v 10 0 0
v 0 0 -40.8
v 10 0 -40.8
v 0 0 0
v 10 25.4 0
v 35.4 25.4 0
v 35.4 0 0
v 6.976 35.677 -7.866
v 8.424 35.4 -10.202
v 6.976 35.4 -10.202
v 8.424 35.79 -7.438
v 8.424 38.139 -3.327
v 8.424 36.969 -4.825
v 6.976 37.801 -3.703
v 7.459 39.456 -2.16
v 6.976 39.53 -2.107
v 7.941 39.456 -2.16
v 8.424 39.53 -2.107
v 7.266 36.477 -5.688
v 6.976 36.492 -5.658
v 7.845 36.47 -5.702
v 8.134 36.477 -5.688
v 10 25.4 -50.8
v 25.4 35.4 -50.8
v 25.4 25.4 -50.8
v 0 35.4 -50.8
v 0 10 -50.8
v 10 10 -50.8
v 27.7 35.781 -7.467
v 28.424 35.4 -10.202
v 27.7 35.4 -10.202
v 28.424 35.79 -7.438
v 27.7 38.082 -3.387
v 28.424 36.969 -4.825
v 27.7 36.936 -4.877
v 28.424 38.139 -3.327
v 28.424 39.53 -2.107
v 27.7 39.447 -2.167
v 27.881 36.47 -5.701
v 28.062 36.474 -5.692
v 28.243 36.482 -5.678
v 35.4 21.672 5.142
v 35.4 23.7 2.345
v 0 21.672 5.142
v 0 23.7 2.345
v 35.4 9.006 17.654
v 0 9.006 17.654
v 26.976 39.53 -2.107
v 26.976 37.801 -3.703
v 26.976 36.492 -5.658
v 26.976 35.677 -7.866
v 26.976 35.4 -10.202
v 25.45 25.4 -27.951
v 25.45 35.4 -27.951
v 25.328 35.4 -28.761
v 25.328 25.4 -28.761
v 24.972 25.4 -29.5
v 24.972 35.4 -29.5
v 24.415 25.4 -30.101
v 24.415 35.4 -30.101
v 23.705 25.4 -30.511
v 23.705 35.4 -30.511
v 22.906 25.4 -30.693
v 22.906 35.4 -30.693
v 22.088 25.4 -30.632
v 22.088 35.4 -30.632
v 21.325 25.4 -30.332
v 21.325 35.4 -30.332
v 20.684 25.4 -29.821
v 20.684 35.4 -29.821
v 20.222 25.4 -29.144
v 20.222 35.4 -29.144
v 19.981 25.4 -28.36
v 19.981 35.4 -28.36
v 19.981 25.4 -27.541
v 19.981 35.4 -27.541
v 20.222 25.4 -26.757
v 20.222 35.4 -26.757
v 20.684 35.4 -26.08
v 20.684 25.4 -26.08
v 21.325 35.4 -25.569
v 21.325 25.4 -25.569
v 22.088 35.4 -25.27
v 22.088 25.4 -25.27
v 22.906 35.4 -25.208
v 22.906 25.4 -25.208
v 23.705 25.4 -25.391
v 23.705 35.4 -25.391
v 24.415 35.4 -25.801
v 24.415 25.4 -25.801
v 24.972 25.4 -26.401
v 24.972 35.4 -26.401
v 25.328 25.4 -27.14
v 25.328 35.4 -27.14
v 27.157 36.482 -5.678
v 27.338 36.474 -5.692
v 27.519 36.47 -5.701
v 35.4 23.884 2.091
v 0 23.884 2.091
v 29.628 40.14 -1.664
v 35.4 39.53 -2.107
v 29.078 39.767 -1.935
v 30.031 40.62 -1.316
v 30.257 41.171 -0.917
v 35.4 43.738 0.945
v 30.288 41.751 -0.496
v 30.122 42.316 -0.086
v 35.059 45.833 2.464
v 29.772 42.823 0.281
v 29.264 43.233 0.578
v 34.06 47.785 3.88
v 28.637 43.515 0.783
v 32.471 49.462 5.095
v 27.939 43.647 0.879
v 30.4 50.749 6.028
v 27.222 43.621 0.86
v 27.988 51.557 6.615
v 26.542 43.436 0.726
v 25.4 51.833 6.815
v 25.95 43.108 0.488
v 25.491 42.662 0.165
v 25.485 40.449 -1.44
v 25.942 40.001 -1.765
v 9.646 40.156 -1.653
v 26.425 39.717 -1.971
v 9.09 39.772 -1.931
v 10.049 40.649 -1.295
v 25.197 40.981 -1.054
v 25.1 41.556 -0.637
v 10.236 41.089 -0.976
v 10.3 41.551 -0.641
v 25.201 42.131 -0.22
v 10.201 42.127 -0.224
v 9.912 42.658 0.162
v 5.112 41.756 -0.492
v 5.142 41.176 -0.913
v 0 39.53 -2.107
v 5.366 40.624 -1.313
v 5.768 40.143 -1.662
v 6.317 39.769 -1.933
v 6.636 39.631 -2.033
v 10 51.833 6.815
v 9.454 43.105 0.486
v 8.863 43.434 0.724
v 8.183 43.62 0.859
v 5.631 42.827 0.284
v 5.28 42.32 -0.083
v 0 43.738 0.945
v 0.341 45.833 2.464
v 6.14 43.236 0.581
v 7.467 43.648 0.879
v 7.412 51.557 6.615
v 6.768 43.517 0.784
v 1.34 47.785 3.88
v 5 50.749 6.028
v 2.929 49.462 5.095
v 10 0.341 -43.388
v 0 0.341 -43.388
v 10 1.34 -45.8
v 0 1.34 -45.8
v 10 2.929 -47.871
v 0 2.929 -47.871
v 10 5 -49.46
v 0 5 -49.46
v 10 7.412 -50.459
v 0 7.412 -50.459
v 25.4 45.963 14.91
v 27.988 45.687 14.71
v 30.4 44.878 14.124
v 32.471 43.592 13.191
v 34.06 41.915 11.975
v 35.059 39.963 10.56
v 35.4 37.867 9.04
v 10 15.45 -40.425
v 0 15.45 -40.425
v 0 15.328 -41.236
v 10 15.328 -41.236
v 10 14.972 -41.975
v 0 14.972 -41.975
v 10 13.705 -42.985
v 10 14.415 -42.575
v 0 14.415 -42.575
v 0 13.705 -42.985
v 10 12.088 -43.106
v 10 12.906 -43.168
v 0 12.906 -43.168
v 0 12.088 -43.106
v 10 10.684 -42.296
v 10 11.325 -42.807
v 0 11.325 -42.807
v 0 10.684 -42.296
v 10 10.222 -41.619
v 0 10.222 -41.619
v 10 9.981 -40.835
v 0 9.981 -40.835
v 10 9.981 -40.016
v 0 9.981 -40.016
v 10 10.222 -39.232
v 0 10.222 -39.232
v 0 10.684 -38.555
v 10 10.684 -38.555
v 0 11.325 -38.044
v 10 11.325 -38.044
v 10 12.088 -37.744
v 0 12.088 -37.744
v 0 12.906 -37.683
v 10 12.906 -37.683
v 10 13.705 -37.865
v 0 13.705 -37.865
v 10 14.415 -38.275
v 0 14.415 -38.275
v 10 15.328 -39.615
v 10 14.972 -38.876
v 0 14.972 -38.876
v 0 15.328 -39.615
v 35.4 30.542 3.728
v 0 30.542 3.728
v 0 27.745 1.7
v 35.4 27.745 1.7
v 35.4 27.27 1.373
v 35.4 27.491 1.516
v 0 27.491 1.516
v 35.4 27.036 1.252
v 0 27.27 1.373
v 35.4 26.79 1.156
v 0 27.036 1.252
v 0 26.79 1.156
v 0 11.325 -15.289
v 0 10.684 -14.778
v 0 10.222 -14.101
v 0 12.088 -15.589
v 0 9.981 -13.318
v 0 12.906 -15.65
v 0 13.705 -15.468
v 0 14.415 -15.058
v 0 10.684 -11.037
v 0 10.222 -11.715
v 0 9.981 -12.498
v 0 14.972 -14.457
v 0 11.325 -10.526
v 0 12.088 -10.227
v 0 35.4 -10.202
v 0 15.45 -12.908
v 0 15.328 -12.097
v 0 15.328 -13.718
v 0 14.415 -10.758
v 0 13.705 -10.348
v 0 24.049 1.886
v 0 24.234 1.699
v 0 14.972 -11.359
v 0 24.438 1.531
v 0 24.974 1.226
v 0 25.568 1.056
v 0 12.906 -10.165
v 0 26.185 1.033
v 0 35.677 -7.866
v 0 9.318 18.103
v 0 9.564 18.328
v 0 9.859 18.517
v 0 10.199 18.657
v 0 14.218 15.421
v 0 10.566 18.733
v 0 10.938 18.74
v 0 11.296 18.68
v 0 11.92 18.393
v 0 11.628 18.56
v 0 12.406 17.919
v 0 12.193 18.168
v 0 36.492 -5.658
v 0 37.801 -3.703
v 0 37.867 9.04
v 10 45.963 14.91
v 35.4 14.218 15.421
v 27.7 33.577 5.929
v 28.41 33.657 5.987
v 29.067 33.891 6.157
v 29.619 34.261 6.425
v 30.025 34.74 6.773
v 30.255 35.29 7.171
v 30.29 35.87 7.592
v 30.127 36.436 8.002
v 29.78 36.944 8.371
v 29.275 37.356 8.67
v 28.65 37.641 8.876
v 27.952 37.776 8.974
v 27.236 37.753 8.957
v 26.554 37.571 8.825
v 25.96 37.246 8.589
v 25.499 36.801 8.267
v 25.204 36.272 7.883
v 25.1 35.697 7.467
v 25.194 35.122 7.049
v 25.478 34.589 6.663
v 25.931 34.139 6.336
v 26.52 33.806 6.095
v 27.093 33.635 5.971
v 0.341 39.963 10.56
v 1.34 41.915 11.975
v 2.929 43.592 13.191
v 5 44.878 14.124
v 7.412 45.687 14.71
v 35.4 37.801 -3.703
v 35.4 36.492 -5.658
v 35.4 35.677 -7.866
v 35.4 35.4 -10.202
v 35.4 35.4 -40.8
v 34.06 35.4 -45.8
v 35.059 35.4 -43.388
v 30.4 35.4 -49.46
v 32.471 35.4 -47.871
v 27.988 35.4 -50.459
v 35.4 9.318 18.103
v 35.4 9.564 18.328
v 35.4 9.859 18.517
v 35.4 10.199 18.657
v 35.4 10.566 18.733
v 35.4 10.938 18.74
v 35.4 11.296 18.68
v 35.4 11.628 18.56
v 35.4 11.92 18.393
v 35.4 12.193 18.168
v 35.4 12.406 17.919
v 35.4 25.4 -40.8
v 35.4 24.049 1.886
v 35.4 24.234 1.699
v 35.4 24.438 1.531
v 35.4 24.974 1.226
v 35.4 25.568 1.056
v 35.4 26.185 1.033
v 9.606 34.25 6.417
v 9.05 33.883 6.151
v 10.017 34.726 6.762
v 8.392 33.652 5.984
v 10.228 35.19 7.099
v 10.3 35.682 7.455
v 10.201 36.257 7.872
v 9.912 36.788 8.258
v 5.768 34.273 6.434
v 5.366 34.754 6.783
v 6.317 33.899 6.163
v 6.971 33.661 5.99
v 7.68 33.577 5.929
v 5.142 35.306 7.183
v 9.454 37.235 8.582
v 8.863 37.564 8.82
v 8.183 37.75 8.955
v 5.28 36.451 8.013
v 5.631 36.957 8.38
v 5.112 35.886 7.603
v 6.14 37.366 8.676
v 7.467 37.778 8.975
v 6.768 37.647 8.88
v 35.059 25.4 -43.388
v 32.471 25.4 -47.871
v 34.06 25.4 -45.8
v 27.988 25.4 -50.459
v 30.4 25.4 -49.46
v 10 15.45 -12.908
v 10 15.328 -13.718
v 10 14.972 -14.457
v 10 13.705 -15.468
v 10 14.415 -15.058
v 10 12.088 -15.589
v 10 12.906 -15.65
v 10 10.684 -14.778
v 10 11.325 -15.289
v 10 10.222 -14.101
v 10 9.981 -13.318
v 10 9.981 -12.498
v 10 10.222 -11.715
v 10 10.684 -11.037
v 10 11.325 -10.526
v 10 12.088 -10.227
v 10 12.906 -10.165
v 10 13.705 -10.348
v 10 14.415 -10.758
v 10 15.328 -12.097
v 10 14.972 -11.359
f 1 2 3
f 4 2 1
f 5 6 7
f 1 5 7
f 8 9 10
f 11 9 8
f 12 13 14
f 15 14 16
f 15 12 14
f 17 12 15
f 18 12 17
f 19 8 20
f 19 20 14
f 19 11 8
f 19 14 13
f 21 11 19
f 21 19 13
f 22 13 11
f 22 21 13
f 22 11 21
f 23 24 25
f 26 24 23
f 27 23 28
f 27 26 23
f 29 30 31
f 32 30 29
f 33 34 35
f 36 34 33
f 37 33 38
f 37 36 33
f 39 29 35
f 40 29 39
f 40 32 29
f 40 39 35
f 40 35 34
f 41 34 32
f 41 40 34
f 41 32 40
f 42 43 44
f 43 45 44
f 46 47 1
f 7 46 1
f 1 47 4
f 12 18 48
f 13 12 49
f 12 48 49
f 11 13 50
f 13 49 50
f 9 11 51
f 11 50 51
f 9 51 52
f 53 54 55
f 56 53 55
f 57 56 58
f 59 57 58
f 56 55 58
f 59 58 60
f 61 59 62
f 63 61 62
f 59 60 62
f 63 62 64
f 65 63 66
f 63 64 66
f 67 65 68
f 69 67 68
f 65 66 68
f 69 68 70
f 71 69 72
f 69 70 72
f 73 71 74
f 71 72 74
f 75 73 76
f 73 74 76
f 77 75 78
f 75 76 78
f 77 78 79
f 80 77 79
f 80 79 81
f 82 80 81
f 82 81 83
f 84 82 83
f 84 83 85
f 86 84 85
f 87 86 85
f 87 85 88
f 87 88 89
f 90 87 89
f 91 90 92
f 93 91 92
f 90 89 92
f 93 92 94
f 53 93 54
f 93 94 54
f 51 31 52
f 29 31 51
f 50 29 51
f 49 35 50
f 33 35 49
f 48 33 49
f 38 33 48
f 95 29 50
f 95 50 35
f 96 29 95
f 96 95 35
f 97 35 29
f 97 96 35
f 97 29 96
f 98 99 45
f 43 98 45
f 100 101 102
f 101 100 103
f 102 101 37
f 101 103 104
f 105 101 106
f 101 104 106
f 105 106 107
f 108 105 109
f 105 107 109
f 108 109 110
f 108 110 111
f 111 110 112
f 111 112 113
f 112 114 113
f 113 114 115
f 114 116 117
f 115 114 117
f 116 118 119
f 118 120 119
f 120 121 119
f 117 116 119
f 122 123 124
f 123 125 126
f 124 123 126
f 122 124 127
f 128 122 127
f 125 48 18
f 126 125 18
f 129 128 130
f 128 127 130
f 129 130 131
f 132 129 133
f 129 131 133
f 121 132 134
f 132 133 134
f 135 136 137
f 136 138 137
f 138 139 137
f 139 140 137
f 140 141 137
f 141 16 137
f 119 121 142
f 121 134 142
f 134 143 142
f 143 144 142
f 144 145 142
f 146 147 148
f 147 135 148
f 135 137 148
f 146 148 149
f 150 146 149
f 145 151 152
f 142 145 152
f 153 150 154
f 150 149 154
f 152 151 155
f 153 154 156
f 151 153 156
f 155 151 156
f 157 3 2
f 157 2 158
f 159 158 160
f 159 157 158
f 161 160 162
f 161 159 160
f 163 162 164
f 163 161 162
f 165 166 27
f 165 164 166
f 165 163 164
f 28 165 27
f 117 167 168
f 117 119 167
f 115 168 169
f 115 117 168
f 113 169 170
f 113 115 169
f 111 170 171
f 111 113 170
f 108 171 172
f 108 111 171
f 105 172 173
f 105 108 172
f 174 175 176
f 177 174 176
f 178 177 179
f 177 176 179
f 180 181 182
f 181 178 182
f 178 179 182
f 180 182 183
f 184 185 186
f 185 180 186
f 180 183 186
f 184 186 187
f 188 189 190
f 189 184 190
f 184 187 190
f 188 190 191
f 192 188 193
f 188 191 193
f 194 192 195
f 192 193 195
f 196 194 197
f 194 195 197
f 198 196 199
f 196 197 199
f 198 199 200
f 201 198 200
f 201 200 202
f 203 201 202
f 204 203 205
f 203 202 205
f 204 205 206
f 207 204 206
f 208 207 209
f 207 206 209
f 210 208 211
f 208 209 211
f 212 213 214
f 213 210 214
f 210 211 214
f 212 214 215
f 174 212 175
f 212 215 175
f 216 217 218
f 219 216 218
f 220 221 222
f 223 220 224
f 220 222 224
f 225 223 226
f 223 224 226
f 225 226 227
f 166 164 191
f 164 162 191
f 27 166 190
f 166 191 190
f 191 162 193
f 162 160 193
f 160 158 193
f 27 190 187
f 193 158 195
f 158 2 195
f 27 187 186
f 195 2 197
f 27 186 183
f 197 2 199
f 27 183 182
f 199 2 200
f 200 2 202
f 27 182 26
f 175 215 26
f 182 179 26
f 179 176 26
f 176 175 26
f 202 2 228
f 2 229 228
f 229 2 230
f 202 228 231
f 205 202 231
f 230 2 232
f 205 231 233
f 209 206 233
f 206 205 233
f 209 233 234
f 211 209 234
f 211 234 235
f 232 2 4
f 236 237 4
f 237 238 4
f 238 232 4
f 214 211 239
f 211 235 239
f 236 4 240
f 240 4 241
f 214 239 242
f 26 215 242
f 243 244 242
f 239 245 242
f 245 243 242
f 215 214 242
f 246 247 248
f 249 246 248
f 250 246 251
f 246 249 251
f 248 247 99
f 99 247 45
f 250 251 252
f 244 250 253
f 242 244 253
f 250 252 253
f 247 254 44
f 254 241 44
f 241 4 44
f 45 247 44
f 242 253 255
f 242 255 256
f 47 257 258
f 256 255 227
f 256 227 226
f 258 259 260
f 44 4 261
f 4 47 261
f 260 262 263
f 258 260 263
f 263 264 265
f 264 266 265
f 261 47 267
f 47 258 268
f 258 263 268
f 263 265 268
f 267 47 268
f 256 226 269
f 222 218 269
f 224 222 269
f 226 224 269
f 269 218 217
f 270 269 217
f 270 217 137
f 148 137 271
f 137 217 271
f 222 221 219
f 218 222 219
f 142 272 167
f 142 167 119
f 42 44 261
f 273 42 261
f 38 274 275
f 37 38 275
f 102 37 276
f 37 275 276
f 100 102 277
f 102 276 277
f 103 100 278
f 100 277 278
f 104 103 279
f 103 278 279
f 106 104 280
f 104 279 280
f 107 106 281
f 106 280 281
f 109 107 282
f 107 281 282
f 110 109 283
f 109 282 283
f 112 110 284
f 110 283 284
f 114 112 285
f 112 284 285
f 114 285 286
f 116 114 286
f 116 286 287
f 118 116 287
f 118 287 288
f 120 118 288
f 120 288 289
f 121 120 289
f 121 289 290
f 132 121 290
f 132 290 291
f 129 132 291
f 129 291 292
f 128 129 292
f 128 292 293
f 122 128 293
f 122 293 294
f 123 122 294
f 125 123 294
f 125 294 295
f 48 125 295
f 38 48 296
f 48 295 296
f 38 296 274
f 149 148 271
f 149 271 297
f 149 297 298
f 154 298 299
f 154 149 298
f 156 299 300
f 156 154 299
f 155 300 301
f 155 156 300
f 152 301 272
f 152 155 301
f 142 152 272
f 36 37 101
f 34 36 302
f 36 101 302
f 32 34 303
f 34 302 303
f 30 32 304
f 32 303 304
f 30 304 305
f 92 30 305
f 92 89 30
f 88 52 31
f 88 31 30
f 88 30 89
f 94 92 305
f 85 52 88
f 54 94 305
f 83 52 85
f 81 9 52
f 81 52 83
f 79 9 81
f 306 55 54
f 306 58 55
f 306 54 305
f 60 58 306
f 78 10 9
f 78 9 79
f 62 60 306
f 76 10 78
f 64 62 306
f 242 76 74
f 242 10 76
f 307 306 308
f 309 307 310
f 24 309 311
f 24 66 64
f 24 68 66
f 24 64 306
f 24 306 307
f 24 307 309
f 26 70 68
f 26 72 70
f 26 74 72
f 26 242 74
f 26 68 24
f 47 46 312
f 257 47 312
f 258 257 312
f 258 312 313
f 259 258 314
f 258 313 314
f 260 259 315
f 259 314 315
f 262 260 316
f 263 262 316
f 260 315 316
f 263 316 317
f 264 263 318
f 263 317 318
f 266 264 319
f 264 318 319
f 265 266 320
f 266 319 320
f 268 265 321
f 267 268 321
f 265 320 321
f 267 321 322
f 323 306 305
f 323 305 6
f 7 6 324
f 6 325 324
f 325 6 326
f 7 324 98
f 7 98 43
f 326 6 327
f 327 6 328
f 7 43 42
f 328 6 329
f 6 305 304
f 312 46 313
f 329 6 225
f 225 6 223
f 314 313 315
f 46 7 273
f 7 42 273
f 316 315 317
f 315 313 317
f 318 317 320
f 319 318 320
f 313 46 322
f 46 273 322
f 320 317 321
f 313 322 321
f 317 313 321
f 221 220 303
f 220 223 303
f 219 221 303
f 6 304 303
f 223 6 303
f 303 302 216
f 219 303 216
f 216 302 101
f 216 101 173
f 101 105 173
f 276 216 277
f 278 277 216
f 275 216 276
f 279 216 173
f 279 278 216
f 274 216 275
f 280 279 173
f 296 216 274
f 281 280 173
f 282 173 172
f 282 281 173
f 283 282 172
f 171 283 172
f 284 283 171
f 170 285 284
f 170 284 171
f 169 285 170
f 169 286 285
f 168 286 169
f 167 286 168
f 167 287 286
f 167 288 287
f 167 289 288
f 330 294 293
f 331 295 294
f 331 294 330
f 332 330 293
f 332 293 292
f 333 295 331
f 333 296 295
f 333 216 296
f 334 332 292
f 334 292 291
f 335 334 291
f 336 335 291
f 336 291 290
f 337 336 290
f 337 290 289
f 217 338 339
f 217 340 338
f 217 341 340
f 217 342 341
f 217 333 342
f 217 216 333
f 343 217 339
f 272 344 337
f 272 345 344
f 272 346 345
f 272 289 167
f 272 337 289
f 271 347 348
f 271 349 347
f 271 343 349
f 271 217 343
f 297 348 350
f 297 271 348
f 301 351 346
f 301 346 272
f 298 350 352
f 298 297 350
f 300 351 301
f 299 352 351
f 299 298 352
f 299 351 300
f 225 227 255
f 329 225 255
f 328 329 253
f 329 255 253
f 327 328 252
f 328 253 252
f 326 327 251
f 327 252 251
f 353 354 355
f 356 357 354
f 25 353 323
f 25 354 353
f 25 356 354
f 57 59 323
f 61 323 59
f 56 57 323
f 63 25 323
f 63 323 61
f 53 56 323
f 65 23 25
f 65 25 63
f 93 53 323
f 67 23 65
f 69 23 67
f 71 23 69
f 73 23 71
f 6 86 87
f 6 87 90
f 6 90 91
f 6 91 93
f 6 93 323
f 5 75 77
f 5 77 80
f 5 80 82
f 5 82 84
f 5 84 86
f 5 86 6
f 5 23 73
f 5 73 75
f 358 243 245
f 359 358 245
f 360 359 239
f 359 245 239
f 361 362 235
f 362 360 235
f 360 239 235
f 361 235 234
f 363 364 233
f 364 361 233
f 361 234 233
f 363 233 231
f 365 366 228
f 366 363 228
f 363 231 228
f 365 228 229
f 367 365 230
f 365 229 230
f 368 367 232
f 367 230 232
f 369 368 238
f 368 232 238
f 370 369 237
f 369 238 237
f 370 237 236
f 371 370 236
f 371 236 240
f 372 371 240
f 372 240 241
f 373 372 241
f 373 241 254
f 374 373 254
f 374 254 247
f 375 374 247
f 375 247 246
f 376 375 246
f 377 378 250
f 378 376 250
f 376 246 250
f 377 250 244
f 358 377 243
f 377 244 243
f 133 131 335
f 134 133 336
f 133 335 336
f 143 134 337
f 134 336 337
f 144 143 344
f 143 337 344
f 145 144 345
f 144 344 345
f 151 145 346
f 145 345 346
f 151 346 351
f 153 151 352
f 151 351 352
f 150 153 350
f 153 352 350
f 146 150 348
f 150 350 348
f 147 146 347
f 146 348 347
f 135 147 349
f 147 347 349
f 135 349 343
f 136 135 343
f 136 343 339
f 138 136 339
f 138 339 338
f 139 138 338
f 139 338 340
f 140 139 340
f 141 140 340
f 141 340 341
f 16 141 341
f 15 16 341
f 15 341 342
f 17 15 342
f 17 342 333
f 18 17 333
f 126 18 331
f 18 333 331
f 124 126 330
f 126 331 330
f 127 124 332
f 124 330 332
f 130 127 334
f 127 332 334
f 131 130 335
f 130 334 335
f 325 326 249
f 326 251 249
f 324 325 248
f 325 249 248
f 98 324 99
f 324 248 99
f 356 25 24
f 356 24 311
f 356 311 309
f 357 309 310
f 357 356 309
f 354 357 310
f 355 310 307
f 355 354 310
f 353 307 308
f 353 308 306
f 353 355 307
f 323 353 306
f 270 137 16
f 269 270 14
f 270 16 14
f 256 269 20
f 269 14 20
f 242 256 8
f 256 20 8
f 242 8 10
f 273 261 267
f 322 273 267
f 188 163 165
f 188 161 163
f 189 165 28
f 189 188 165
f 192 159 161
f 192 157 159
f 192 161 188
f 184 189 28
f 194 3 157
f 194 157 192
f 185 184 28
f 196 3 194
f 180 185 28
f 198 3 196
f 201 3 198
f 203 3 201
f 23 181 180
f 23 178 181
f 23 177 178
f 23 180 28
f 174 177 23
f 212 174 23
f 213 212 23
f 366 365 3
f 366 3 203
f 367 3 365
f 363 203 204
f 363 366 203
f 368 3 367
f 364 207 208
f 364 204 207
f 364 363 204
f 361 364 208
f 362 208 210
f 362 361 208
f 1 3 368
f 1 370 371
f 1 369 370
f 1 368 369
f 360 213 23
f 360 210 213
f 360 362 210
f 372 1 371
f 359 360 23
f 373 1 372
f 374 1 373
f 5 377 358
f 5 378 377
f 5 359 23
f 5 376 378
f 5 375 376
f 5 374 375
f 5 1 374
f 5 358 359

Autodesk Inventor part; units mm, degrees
ref_plane "YZ Plane" through (0, 0, 0) normal (1, 0, 0) x (0, 1, 0)
ref_plane "XZ Plane" through (0, 0, 0) normal (0, 1, 0) x (-1, 0, 0)
ref_plane "XY Plane" through (0, 0, 0) normal (0, 0, 1) x (1, 0, 0)
sketch "Sketch1" plane through (0, 0, 0) normal (1, 0, 0) x (0, 1, 0)
  line L0 (0, 0) -> (25.4, 0)
  line L1 (25.4, 0) -> (25.4, -50.8)
  line L2 (25.4, -50.8) -> (0, -50.8)
  line L3 (0, -50.8) -> (0, 0)
  circle A0 centre (12.7, -12.9077) radius 2.75
  circle A1 centre (12.7, -40.4254) radius 2.75
  dimension "d0" = 25.4
  dimension "d1" = 50.8
  dimension "d2" = 5.5
  dimension "d3" = 5.5
extrude "Extrusion1" add sketch "Sketch1" along normal blind 10
sketch "Sketch2" plane through (0, 0, 0) normal (-1, 0, 0) x (0, 0, 1)
  line L0 (-50.8, 0) -> (-50.8, 25.4)
  line L1 (0, 0) -> (-50.8, 0)
  line L2 (0, 25.4) -> (0, 0)
  line L3 (-50.8, 25.4) -> (0, 25.4)
  circle A0 centre (-40.4254, 12.7) radius 2.75
  circle A1 centre (-12.9077, 12.7) radius 2.75
  line L4 (2.3448, 23.6998) -> (5.142, 21.6715)
  line L5 (3.7285, 30.542) -> (1.7002, 27.7448)
  line L6 (20.0524, 42.2345) -> (17.2552, 44.2628)
  line L7 (22.2632, 12.8343) -> (24.2915, 15.6316)
  line L8 (15.4211, 14.2181) -> (18.2183, 12.1898)
  line L9 (0, 25.4) -> (14.9104, 45.963)
  line L10 (14.9104, 45.963) -> (6.8148, 51.8333)
  line L11 (-12.3523, 25.4) -> (6.8148, 51.8333)
  line L12 (0, 25.4) -> (20.563, 10.4896)
  line L13 (20.563, 10.4896) -> (0, 0)
  line L14 (-50.8, 25.4) -> (0, 25.4)
  line L15 (0, 25.4) -> (0, 35.4)
  line L16 (0, 35.4) -> (-50.8, 35.4)
  line L17 (-50.8, 35.4) -> (-50.8, 25.4)
  arc A2 (1.1565, 26.7905) -> (1.5314, 24.4378) centre (3.607, 25.9748) ccw
  arc A3 (1.5161, 27.4909) -> (2.0909, 23.8839) centre (3.607, 25.9748) ccw
  point P0 (-5.1012, 35.4)
  point P1 (1.5314, 24.4378)
  point P2 (1.1565, 26.7905)
extrude "Extrusion2" add sketch "Sketch2" against normal blind 35.4 contours L17 L16 L11 L3 | L2 L12 L4 L8 L13 | L11 L16 L15 L3 | L15 L16 L11 L10 L9 L5 | L9 A3 A2 L12
sketch "Sketch3" plane through (0, 35.4, -5.1012) normal (0, 1, 0) x (1, 0, 0)
  line L0 (0, 0) -> (0, 45.6988) projected
  line L1 (0, 0) -> (35.4, 0) projected
  line L2 (35.4, 45.6988) -> (35.4, 0) projected
  line L3 (0, 45.6988) -> (35.4, 45.6988) projected
  line L4 (10, 45.6988) -> (10, -5.1012) projected
  line L5 (10, 45.6988) -> (35.4, 45.6988) projected
  line L6 (35.4, -5.1012) -> (35.4, 45.6988) projected
  line L7 (10, -5.1012) -> (35.4, -5.1012) projected
  line L8 (10, 38.0742) -> (10, 32.5742) projected
  line L9 (10, 45.6988) -> (10, -5.1012) projected
  line L10 (10, -5.1012) -> (10, 45.6988) projected
  line L11 (10, 38.0742) -> (10, 32.5742) projected
  line L12 (10, 10.5565) -> (10, 5.0565) projected
  circle A0 centre (22.7, 22.8494) radius 2.75
  point P0 (0, -5.1012)
  dimension "d10" = 5.5
extrude "Extrusion3" cut sketch "Sketch3" against normal blind 35.4 contours A0
sketch "Sketch4" plane through (0, 27.4909, 1.5161) normal (0, -0.587, 0.8096) x (1, 0, 0)
  line L0 (0, -2.5827) -> (35.4, -2.5827) projected
  line L1 (0, 22.8173) -> (35.4, 22.8173) projected
  line L2 (0, 22.8173) -> (0, 2.5185) projected
  line L3 (0, 22.8173) -> (0, -2.5827) construction
  line L4 (7.7, 10.1173) -> (27.7, 10.1173) construction
  line L5 (7.7, 7.5173) -> (27.7, 7.5173)
  line L6 (27.7, 12.7173) -> (7.7, 12.7173)
  arc A0 (7.7, 12.7173) -> (7.7, 7.5173) centre (7.7, 10.1173) ccw
  arc A1 (27.7, 7.5173) -> (27.7, 12.7173) centre (27.7, 10.1173) ccw
  circle A2 centre (7.7, 10.1173) radius 2.6
  circle A3 centre (27.7, 10.1173) radius 2.6
  point P0 (0, -23.1457)
  point P1 (17.7, 10.1173)
  dimension "d13" = 2.6
  dimension "d14" = 20
extrude "Extrusion4" cut sketch "Sketch4" against normal blind 35.4 contours A0 A2 | A3 A1
fillet "Fillet1" radius 10 1 edges at (17.7, 35.4, -5.1012)
fillet "Fillet2" radius 10 4 edges at (0, 48.8982, 10.8626) (35.4, 48.8982, 10.8626) (35.4, 30.4, -50.8) (5, 0, -50.8)
fillet "Fillet3" radius 2 1 edges at (17.7, 10.4896, 20.563)
properties part number "lowerRearBracket"
